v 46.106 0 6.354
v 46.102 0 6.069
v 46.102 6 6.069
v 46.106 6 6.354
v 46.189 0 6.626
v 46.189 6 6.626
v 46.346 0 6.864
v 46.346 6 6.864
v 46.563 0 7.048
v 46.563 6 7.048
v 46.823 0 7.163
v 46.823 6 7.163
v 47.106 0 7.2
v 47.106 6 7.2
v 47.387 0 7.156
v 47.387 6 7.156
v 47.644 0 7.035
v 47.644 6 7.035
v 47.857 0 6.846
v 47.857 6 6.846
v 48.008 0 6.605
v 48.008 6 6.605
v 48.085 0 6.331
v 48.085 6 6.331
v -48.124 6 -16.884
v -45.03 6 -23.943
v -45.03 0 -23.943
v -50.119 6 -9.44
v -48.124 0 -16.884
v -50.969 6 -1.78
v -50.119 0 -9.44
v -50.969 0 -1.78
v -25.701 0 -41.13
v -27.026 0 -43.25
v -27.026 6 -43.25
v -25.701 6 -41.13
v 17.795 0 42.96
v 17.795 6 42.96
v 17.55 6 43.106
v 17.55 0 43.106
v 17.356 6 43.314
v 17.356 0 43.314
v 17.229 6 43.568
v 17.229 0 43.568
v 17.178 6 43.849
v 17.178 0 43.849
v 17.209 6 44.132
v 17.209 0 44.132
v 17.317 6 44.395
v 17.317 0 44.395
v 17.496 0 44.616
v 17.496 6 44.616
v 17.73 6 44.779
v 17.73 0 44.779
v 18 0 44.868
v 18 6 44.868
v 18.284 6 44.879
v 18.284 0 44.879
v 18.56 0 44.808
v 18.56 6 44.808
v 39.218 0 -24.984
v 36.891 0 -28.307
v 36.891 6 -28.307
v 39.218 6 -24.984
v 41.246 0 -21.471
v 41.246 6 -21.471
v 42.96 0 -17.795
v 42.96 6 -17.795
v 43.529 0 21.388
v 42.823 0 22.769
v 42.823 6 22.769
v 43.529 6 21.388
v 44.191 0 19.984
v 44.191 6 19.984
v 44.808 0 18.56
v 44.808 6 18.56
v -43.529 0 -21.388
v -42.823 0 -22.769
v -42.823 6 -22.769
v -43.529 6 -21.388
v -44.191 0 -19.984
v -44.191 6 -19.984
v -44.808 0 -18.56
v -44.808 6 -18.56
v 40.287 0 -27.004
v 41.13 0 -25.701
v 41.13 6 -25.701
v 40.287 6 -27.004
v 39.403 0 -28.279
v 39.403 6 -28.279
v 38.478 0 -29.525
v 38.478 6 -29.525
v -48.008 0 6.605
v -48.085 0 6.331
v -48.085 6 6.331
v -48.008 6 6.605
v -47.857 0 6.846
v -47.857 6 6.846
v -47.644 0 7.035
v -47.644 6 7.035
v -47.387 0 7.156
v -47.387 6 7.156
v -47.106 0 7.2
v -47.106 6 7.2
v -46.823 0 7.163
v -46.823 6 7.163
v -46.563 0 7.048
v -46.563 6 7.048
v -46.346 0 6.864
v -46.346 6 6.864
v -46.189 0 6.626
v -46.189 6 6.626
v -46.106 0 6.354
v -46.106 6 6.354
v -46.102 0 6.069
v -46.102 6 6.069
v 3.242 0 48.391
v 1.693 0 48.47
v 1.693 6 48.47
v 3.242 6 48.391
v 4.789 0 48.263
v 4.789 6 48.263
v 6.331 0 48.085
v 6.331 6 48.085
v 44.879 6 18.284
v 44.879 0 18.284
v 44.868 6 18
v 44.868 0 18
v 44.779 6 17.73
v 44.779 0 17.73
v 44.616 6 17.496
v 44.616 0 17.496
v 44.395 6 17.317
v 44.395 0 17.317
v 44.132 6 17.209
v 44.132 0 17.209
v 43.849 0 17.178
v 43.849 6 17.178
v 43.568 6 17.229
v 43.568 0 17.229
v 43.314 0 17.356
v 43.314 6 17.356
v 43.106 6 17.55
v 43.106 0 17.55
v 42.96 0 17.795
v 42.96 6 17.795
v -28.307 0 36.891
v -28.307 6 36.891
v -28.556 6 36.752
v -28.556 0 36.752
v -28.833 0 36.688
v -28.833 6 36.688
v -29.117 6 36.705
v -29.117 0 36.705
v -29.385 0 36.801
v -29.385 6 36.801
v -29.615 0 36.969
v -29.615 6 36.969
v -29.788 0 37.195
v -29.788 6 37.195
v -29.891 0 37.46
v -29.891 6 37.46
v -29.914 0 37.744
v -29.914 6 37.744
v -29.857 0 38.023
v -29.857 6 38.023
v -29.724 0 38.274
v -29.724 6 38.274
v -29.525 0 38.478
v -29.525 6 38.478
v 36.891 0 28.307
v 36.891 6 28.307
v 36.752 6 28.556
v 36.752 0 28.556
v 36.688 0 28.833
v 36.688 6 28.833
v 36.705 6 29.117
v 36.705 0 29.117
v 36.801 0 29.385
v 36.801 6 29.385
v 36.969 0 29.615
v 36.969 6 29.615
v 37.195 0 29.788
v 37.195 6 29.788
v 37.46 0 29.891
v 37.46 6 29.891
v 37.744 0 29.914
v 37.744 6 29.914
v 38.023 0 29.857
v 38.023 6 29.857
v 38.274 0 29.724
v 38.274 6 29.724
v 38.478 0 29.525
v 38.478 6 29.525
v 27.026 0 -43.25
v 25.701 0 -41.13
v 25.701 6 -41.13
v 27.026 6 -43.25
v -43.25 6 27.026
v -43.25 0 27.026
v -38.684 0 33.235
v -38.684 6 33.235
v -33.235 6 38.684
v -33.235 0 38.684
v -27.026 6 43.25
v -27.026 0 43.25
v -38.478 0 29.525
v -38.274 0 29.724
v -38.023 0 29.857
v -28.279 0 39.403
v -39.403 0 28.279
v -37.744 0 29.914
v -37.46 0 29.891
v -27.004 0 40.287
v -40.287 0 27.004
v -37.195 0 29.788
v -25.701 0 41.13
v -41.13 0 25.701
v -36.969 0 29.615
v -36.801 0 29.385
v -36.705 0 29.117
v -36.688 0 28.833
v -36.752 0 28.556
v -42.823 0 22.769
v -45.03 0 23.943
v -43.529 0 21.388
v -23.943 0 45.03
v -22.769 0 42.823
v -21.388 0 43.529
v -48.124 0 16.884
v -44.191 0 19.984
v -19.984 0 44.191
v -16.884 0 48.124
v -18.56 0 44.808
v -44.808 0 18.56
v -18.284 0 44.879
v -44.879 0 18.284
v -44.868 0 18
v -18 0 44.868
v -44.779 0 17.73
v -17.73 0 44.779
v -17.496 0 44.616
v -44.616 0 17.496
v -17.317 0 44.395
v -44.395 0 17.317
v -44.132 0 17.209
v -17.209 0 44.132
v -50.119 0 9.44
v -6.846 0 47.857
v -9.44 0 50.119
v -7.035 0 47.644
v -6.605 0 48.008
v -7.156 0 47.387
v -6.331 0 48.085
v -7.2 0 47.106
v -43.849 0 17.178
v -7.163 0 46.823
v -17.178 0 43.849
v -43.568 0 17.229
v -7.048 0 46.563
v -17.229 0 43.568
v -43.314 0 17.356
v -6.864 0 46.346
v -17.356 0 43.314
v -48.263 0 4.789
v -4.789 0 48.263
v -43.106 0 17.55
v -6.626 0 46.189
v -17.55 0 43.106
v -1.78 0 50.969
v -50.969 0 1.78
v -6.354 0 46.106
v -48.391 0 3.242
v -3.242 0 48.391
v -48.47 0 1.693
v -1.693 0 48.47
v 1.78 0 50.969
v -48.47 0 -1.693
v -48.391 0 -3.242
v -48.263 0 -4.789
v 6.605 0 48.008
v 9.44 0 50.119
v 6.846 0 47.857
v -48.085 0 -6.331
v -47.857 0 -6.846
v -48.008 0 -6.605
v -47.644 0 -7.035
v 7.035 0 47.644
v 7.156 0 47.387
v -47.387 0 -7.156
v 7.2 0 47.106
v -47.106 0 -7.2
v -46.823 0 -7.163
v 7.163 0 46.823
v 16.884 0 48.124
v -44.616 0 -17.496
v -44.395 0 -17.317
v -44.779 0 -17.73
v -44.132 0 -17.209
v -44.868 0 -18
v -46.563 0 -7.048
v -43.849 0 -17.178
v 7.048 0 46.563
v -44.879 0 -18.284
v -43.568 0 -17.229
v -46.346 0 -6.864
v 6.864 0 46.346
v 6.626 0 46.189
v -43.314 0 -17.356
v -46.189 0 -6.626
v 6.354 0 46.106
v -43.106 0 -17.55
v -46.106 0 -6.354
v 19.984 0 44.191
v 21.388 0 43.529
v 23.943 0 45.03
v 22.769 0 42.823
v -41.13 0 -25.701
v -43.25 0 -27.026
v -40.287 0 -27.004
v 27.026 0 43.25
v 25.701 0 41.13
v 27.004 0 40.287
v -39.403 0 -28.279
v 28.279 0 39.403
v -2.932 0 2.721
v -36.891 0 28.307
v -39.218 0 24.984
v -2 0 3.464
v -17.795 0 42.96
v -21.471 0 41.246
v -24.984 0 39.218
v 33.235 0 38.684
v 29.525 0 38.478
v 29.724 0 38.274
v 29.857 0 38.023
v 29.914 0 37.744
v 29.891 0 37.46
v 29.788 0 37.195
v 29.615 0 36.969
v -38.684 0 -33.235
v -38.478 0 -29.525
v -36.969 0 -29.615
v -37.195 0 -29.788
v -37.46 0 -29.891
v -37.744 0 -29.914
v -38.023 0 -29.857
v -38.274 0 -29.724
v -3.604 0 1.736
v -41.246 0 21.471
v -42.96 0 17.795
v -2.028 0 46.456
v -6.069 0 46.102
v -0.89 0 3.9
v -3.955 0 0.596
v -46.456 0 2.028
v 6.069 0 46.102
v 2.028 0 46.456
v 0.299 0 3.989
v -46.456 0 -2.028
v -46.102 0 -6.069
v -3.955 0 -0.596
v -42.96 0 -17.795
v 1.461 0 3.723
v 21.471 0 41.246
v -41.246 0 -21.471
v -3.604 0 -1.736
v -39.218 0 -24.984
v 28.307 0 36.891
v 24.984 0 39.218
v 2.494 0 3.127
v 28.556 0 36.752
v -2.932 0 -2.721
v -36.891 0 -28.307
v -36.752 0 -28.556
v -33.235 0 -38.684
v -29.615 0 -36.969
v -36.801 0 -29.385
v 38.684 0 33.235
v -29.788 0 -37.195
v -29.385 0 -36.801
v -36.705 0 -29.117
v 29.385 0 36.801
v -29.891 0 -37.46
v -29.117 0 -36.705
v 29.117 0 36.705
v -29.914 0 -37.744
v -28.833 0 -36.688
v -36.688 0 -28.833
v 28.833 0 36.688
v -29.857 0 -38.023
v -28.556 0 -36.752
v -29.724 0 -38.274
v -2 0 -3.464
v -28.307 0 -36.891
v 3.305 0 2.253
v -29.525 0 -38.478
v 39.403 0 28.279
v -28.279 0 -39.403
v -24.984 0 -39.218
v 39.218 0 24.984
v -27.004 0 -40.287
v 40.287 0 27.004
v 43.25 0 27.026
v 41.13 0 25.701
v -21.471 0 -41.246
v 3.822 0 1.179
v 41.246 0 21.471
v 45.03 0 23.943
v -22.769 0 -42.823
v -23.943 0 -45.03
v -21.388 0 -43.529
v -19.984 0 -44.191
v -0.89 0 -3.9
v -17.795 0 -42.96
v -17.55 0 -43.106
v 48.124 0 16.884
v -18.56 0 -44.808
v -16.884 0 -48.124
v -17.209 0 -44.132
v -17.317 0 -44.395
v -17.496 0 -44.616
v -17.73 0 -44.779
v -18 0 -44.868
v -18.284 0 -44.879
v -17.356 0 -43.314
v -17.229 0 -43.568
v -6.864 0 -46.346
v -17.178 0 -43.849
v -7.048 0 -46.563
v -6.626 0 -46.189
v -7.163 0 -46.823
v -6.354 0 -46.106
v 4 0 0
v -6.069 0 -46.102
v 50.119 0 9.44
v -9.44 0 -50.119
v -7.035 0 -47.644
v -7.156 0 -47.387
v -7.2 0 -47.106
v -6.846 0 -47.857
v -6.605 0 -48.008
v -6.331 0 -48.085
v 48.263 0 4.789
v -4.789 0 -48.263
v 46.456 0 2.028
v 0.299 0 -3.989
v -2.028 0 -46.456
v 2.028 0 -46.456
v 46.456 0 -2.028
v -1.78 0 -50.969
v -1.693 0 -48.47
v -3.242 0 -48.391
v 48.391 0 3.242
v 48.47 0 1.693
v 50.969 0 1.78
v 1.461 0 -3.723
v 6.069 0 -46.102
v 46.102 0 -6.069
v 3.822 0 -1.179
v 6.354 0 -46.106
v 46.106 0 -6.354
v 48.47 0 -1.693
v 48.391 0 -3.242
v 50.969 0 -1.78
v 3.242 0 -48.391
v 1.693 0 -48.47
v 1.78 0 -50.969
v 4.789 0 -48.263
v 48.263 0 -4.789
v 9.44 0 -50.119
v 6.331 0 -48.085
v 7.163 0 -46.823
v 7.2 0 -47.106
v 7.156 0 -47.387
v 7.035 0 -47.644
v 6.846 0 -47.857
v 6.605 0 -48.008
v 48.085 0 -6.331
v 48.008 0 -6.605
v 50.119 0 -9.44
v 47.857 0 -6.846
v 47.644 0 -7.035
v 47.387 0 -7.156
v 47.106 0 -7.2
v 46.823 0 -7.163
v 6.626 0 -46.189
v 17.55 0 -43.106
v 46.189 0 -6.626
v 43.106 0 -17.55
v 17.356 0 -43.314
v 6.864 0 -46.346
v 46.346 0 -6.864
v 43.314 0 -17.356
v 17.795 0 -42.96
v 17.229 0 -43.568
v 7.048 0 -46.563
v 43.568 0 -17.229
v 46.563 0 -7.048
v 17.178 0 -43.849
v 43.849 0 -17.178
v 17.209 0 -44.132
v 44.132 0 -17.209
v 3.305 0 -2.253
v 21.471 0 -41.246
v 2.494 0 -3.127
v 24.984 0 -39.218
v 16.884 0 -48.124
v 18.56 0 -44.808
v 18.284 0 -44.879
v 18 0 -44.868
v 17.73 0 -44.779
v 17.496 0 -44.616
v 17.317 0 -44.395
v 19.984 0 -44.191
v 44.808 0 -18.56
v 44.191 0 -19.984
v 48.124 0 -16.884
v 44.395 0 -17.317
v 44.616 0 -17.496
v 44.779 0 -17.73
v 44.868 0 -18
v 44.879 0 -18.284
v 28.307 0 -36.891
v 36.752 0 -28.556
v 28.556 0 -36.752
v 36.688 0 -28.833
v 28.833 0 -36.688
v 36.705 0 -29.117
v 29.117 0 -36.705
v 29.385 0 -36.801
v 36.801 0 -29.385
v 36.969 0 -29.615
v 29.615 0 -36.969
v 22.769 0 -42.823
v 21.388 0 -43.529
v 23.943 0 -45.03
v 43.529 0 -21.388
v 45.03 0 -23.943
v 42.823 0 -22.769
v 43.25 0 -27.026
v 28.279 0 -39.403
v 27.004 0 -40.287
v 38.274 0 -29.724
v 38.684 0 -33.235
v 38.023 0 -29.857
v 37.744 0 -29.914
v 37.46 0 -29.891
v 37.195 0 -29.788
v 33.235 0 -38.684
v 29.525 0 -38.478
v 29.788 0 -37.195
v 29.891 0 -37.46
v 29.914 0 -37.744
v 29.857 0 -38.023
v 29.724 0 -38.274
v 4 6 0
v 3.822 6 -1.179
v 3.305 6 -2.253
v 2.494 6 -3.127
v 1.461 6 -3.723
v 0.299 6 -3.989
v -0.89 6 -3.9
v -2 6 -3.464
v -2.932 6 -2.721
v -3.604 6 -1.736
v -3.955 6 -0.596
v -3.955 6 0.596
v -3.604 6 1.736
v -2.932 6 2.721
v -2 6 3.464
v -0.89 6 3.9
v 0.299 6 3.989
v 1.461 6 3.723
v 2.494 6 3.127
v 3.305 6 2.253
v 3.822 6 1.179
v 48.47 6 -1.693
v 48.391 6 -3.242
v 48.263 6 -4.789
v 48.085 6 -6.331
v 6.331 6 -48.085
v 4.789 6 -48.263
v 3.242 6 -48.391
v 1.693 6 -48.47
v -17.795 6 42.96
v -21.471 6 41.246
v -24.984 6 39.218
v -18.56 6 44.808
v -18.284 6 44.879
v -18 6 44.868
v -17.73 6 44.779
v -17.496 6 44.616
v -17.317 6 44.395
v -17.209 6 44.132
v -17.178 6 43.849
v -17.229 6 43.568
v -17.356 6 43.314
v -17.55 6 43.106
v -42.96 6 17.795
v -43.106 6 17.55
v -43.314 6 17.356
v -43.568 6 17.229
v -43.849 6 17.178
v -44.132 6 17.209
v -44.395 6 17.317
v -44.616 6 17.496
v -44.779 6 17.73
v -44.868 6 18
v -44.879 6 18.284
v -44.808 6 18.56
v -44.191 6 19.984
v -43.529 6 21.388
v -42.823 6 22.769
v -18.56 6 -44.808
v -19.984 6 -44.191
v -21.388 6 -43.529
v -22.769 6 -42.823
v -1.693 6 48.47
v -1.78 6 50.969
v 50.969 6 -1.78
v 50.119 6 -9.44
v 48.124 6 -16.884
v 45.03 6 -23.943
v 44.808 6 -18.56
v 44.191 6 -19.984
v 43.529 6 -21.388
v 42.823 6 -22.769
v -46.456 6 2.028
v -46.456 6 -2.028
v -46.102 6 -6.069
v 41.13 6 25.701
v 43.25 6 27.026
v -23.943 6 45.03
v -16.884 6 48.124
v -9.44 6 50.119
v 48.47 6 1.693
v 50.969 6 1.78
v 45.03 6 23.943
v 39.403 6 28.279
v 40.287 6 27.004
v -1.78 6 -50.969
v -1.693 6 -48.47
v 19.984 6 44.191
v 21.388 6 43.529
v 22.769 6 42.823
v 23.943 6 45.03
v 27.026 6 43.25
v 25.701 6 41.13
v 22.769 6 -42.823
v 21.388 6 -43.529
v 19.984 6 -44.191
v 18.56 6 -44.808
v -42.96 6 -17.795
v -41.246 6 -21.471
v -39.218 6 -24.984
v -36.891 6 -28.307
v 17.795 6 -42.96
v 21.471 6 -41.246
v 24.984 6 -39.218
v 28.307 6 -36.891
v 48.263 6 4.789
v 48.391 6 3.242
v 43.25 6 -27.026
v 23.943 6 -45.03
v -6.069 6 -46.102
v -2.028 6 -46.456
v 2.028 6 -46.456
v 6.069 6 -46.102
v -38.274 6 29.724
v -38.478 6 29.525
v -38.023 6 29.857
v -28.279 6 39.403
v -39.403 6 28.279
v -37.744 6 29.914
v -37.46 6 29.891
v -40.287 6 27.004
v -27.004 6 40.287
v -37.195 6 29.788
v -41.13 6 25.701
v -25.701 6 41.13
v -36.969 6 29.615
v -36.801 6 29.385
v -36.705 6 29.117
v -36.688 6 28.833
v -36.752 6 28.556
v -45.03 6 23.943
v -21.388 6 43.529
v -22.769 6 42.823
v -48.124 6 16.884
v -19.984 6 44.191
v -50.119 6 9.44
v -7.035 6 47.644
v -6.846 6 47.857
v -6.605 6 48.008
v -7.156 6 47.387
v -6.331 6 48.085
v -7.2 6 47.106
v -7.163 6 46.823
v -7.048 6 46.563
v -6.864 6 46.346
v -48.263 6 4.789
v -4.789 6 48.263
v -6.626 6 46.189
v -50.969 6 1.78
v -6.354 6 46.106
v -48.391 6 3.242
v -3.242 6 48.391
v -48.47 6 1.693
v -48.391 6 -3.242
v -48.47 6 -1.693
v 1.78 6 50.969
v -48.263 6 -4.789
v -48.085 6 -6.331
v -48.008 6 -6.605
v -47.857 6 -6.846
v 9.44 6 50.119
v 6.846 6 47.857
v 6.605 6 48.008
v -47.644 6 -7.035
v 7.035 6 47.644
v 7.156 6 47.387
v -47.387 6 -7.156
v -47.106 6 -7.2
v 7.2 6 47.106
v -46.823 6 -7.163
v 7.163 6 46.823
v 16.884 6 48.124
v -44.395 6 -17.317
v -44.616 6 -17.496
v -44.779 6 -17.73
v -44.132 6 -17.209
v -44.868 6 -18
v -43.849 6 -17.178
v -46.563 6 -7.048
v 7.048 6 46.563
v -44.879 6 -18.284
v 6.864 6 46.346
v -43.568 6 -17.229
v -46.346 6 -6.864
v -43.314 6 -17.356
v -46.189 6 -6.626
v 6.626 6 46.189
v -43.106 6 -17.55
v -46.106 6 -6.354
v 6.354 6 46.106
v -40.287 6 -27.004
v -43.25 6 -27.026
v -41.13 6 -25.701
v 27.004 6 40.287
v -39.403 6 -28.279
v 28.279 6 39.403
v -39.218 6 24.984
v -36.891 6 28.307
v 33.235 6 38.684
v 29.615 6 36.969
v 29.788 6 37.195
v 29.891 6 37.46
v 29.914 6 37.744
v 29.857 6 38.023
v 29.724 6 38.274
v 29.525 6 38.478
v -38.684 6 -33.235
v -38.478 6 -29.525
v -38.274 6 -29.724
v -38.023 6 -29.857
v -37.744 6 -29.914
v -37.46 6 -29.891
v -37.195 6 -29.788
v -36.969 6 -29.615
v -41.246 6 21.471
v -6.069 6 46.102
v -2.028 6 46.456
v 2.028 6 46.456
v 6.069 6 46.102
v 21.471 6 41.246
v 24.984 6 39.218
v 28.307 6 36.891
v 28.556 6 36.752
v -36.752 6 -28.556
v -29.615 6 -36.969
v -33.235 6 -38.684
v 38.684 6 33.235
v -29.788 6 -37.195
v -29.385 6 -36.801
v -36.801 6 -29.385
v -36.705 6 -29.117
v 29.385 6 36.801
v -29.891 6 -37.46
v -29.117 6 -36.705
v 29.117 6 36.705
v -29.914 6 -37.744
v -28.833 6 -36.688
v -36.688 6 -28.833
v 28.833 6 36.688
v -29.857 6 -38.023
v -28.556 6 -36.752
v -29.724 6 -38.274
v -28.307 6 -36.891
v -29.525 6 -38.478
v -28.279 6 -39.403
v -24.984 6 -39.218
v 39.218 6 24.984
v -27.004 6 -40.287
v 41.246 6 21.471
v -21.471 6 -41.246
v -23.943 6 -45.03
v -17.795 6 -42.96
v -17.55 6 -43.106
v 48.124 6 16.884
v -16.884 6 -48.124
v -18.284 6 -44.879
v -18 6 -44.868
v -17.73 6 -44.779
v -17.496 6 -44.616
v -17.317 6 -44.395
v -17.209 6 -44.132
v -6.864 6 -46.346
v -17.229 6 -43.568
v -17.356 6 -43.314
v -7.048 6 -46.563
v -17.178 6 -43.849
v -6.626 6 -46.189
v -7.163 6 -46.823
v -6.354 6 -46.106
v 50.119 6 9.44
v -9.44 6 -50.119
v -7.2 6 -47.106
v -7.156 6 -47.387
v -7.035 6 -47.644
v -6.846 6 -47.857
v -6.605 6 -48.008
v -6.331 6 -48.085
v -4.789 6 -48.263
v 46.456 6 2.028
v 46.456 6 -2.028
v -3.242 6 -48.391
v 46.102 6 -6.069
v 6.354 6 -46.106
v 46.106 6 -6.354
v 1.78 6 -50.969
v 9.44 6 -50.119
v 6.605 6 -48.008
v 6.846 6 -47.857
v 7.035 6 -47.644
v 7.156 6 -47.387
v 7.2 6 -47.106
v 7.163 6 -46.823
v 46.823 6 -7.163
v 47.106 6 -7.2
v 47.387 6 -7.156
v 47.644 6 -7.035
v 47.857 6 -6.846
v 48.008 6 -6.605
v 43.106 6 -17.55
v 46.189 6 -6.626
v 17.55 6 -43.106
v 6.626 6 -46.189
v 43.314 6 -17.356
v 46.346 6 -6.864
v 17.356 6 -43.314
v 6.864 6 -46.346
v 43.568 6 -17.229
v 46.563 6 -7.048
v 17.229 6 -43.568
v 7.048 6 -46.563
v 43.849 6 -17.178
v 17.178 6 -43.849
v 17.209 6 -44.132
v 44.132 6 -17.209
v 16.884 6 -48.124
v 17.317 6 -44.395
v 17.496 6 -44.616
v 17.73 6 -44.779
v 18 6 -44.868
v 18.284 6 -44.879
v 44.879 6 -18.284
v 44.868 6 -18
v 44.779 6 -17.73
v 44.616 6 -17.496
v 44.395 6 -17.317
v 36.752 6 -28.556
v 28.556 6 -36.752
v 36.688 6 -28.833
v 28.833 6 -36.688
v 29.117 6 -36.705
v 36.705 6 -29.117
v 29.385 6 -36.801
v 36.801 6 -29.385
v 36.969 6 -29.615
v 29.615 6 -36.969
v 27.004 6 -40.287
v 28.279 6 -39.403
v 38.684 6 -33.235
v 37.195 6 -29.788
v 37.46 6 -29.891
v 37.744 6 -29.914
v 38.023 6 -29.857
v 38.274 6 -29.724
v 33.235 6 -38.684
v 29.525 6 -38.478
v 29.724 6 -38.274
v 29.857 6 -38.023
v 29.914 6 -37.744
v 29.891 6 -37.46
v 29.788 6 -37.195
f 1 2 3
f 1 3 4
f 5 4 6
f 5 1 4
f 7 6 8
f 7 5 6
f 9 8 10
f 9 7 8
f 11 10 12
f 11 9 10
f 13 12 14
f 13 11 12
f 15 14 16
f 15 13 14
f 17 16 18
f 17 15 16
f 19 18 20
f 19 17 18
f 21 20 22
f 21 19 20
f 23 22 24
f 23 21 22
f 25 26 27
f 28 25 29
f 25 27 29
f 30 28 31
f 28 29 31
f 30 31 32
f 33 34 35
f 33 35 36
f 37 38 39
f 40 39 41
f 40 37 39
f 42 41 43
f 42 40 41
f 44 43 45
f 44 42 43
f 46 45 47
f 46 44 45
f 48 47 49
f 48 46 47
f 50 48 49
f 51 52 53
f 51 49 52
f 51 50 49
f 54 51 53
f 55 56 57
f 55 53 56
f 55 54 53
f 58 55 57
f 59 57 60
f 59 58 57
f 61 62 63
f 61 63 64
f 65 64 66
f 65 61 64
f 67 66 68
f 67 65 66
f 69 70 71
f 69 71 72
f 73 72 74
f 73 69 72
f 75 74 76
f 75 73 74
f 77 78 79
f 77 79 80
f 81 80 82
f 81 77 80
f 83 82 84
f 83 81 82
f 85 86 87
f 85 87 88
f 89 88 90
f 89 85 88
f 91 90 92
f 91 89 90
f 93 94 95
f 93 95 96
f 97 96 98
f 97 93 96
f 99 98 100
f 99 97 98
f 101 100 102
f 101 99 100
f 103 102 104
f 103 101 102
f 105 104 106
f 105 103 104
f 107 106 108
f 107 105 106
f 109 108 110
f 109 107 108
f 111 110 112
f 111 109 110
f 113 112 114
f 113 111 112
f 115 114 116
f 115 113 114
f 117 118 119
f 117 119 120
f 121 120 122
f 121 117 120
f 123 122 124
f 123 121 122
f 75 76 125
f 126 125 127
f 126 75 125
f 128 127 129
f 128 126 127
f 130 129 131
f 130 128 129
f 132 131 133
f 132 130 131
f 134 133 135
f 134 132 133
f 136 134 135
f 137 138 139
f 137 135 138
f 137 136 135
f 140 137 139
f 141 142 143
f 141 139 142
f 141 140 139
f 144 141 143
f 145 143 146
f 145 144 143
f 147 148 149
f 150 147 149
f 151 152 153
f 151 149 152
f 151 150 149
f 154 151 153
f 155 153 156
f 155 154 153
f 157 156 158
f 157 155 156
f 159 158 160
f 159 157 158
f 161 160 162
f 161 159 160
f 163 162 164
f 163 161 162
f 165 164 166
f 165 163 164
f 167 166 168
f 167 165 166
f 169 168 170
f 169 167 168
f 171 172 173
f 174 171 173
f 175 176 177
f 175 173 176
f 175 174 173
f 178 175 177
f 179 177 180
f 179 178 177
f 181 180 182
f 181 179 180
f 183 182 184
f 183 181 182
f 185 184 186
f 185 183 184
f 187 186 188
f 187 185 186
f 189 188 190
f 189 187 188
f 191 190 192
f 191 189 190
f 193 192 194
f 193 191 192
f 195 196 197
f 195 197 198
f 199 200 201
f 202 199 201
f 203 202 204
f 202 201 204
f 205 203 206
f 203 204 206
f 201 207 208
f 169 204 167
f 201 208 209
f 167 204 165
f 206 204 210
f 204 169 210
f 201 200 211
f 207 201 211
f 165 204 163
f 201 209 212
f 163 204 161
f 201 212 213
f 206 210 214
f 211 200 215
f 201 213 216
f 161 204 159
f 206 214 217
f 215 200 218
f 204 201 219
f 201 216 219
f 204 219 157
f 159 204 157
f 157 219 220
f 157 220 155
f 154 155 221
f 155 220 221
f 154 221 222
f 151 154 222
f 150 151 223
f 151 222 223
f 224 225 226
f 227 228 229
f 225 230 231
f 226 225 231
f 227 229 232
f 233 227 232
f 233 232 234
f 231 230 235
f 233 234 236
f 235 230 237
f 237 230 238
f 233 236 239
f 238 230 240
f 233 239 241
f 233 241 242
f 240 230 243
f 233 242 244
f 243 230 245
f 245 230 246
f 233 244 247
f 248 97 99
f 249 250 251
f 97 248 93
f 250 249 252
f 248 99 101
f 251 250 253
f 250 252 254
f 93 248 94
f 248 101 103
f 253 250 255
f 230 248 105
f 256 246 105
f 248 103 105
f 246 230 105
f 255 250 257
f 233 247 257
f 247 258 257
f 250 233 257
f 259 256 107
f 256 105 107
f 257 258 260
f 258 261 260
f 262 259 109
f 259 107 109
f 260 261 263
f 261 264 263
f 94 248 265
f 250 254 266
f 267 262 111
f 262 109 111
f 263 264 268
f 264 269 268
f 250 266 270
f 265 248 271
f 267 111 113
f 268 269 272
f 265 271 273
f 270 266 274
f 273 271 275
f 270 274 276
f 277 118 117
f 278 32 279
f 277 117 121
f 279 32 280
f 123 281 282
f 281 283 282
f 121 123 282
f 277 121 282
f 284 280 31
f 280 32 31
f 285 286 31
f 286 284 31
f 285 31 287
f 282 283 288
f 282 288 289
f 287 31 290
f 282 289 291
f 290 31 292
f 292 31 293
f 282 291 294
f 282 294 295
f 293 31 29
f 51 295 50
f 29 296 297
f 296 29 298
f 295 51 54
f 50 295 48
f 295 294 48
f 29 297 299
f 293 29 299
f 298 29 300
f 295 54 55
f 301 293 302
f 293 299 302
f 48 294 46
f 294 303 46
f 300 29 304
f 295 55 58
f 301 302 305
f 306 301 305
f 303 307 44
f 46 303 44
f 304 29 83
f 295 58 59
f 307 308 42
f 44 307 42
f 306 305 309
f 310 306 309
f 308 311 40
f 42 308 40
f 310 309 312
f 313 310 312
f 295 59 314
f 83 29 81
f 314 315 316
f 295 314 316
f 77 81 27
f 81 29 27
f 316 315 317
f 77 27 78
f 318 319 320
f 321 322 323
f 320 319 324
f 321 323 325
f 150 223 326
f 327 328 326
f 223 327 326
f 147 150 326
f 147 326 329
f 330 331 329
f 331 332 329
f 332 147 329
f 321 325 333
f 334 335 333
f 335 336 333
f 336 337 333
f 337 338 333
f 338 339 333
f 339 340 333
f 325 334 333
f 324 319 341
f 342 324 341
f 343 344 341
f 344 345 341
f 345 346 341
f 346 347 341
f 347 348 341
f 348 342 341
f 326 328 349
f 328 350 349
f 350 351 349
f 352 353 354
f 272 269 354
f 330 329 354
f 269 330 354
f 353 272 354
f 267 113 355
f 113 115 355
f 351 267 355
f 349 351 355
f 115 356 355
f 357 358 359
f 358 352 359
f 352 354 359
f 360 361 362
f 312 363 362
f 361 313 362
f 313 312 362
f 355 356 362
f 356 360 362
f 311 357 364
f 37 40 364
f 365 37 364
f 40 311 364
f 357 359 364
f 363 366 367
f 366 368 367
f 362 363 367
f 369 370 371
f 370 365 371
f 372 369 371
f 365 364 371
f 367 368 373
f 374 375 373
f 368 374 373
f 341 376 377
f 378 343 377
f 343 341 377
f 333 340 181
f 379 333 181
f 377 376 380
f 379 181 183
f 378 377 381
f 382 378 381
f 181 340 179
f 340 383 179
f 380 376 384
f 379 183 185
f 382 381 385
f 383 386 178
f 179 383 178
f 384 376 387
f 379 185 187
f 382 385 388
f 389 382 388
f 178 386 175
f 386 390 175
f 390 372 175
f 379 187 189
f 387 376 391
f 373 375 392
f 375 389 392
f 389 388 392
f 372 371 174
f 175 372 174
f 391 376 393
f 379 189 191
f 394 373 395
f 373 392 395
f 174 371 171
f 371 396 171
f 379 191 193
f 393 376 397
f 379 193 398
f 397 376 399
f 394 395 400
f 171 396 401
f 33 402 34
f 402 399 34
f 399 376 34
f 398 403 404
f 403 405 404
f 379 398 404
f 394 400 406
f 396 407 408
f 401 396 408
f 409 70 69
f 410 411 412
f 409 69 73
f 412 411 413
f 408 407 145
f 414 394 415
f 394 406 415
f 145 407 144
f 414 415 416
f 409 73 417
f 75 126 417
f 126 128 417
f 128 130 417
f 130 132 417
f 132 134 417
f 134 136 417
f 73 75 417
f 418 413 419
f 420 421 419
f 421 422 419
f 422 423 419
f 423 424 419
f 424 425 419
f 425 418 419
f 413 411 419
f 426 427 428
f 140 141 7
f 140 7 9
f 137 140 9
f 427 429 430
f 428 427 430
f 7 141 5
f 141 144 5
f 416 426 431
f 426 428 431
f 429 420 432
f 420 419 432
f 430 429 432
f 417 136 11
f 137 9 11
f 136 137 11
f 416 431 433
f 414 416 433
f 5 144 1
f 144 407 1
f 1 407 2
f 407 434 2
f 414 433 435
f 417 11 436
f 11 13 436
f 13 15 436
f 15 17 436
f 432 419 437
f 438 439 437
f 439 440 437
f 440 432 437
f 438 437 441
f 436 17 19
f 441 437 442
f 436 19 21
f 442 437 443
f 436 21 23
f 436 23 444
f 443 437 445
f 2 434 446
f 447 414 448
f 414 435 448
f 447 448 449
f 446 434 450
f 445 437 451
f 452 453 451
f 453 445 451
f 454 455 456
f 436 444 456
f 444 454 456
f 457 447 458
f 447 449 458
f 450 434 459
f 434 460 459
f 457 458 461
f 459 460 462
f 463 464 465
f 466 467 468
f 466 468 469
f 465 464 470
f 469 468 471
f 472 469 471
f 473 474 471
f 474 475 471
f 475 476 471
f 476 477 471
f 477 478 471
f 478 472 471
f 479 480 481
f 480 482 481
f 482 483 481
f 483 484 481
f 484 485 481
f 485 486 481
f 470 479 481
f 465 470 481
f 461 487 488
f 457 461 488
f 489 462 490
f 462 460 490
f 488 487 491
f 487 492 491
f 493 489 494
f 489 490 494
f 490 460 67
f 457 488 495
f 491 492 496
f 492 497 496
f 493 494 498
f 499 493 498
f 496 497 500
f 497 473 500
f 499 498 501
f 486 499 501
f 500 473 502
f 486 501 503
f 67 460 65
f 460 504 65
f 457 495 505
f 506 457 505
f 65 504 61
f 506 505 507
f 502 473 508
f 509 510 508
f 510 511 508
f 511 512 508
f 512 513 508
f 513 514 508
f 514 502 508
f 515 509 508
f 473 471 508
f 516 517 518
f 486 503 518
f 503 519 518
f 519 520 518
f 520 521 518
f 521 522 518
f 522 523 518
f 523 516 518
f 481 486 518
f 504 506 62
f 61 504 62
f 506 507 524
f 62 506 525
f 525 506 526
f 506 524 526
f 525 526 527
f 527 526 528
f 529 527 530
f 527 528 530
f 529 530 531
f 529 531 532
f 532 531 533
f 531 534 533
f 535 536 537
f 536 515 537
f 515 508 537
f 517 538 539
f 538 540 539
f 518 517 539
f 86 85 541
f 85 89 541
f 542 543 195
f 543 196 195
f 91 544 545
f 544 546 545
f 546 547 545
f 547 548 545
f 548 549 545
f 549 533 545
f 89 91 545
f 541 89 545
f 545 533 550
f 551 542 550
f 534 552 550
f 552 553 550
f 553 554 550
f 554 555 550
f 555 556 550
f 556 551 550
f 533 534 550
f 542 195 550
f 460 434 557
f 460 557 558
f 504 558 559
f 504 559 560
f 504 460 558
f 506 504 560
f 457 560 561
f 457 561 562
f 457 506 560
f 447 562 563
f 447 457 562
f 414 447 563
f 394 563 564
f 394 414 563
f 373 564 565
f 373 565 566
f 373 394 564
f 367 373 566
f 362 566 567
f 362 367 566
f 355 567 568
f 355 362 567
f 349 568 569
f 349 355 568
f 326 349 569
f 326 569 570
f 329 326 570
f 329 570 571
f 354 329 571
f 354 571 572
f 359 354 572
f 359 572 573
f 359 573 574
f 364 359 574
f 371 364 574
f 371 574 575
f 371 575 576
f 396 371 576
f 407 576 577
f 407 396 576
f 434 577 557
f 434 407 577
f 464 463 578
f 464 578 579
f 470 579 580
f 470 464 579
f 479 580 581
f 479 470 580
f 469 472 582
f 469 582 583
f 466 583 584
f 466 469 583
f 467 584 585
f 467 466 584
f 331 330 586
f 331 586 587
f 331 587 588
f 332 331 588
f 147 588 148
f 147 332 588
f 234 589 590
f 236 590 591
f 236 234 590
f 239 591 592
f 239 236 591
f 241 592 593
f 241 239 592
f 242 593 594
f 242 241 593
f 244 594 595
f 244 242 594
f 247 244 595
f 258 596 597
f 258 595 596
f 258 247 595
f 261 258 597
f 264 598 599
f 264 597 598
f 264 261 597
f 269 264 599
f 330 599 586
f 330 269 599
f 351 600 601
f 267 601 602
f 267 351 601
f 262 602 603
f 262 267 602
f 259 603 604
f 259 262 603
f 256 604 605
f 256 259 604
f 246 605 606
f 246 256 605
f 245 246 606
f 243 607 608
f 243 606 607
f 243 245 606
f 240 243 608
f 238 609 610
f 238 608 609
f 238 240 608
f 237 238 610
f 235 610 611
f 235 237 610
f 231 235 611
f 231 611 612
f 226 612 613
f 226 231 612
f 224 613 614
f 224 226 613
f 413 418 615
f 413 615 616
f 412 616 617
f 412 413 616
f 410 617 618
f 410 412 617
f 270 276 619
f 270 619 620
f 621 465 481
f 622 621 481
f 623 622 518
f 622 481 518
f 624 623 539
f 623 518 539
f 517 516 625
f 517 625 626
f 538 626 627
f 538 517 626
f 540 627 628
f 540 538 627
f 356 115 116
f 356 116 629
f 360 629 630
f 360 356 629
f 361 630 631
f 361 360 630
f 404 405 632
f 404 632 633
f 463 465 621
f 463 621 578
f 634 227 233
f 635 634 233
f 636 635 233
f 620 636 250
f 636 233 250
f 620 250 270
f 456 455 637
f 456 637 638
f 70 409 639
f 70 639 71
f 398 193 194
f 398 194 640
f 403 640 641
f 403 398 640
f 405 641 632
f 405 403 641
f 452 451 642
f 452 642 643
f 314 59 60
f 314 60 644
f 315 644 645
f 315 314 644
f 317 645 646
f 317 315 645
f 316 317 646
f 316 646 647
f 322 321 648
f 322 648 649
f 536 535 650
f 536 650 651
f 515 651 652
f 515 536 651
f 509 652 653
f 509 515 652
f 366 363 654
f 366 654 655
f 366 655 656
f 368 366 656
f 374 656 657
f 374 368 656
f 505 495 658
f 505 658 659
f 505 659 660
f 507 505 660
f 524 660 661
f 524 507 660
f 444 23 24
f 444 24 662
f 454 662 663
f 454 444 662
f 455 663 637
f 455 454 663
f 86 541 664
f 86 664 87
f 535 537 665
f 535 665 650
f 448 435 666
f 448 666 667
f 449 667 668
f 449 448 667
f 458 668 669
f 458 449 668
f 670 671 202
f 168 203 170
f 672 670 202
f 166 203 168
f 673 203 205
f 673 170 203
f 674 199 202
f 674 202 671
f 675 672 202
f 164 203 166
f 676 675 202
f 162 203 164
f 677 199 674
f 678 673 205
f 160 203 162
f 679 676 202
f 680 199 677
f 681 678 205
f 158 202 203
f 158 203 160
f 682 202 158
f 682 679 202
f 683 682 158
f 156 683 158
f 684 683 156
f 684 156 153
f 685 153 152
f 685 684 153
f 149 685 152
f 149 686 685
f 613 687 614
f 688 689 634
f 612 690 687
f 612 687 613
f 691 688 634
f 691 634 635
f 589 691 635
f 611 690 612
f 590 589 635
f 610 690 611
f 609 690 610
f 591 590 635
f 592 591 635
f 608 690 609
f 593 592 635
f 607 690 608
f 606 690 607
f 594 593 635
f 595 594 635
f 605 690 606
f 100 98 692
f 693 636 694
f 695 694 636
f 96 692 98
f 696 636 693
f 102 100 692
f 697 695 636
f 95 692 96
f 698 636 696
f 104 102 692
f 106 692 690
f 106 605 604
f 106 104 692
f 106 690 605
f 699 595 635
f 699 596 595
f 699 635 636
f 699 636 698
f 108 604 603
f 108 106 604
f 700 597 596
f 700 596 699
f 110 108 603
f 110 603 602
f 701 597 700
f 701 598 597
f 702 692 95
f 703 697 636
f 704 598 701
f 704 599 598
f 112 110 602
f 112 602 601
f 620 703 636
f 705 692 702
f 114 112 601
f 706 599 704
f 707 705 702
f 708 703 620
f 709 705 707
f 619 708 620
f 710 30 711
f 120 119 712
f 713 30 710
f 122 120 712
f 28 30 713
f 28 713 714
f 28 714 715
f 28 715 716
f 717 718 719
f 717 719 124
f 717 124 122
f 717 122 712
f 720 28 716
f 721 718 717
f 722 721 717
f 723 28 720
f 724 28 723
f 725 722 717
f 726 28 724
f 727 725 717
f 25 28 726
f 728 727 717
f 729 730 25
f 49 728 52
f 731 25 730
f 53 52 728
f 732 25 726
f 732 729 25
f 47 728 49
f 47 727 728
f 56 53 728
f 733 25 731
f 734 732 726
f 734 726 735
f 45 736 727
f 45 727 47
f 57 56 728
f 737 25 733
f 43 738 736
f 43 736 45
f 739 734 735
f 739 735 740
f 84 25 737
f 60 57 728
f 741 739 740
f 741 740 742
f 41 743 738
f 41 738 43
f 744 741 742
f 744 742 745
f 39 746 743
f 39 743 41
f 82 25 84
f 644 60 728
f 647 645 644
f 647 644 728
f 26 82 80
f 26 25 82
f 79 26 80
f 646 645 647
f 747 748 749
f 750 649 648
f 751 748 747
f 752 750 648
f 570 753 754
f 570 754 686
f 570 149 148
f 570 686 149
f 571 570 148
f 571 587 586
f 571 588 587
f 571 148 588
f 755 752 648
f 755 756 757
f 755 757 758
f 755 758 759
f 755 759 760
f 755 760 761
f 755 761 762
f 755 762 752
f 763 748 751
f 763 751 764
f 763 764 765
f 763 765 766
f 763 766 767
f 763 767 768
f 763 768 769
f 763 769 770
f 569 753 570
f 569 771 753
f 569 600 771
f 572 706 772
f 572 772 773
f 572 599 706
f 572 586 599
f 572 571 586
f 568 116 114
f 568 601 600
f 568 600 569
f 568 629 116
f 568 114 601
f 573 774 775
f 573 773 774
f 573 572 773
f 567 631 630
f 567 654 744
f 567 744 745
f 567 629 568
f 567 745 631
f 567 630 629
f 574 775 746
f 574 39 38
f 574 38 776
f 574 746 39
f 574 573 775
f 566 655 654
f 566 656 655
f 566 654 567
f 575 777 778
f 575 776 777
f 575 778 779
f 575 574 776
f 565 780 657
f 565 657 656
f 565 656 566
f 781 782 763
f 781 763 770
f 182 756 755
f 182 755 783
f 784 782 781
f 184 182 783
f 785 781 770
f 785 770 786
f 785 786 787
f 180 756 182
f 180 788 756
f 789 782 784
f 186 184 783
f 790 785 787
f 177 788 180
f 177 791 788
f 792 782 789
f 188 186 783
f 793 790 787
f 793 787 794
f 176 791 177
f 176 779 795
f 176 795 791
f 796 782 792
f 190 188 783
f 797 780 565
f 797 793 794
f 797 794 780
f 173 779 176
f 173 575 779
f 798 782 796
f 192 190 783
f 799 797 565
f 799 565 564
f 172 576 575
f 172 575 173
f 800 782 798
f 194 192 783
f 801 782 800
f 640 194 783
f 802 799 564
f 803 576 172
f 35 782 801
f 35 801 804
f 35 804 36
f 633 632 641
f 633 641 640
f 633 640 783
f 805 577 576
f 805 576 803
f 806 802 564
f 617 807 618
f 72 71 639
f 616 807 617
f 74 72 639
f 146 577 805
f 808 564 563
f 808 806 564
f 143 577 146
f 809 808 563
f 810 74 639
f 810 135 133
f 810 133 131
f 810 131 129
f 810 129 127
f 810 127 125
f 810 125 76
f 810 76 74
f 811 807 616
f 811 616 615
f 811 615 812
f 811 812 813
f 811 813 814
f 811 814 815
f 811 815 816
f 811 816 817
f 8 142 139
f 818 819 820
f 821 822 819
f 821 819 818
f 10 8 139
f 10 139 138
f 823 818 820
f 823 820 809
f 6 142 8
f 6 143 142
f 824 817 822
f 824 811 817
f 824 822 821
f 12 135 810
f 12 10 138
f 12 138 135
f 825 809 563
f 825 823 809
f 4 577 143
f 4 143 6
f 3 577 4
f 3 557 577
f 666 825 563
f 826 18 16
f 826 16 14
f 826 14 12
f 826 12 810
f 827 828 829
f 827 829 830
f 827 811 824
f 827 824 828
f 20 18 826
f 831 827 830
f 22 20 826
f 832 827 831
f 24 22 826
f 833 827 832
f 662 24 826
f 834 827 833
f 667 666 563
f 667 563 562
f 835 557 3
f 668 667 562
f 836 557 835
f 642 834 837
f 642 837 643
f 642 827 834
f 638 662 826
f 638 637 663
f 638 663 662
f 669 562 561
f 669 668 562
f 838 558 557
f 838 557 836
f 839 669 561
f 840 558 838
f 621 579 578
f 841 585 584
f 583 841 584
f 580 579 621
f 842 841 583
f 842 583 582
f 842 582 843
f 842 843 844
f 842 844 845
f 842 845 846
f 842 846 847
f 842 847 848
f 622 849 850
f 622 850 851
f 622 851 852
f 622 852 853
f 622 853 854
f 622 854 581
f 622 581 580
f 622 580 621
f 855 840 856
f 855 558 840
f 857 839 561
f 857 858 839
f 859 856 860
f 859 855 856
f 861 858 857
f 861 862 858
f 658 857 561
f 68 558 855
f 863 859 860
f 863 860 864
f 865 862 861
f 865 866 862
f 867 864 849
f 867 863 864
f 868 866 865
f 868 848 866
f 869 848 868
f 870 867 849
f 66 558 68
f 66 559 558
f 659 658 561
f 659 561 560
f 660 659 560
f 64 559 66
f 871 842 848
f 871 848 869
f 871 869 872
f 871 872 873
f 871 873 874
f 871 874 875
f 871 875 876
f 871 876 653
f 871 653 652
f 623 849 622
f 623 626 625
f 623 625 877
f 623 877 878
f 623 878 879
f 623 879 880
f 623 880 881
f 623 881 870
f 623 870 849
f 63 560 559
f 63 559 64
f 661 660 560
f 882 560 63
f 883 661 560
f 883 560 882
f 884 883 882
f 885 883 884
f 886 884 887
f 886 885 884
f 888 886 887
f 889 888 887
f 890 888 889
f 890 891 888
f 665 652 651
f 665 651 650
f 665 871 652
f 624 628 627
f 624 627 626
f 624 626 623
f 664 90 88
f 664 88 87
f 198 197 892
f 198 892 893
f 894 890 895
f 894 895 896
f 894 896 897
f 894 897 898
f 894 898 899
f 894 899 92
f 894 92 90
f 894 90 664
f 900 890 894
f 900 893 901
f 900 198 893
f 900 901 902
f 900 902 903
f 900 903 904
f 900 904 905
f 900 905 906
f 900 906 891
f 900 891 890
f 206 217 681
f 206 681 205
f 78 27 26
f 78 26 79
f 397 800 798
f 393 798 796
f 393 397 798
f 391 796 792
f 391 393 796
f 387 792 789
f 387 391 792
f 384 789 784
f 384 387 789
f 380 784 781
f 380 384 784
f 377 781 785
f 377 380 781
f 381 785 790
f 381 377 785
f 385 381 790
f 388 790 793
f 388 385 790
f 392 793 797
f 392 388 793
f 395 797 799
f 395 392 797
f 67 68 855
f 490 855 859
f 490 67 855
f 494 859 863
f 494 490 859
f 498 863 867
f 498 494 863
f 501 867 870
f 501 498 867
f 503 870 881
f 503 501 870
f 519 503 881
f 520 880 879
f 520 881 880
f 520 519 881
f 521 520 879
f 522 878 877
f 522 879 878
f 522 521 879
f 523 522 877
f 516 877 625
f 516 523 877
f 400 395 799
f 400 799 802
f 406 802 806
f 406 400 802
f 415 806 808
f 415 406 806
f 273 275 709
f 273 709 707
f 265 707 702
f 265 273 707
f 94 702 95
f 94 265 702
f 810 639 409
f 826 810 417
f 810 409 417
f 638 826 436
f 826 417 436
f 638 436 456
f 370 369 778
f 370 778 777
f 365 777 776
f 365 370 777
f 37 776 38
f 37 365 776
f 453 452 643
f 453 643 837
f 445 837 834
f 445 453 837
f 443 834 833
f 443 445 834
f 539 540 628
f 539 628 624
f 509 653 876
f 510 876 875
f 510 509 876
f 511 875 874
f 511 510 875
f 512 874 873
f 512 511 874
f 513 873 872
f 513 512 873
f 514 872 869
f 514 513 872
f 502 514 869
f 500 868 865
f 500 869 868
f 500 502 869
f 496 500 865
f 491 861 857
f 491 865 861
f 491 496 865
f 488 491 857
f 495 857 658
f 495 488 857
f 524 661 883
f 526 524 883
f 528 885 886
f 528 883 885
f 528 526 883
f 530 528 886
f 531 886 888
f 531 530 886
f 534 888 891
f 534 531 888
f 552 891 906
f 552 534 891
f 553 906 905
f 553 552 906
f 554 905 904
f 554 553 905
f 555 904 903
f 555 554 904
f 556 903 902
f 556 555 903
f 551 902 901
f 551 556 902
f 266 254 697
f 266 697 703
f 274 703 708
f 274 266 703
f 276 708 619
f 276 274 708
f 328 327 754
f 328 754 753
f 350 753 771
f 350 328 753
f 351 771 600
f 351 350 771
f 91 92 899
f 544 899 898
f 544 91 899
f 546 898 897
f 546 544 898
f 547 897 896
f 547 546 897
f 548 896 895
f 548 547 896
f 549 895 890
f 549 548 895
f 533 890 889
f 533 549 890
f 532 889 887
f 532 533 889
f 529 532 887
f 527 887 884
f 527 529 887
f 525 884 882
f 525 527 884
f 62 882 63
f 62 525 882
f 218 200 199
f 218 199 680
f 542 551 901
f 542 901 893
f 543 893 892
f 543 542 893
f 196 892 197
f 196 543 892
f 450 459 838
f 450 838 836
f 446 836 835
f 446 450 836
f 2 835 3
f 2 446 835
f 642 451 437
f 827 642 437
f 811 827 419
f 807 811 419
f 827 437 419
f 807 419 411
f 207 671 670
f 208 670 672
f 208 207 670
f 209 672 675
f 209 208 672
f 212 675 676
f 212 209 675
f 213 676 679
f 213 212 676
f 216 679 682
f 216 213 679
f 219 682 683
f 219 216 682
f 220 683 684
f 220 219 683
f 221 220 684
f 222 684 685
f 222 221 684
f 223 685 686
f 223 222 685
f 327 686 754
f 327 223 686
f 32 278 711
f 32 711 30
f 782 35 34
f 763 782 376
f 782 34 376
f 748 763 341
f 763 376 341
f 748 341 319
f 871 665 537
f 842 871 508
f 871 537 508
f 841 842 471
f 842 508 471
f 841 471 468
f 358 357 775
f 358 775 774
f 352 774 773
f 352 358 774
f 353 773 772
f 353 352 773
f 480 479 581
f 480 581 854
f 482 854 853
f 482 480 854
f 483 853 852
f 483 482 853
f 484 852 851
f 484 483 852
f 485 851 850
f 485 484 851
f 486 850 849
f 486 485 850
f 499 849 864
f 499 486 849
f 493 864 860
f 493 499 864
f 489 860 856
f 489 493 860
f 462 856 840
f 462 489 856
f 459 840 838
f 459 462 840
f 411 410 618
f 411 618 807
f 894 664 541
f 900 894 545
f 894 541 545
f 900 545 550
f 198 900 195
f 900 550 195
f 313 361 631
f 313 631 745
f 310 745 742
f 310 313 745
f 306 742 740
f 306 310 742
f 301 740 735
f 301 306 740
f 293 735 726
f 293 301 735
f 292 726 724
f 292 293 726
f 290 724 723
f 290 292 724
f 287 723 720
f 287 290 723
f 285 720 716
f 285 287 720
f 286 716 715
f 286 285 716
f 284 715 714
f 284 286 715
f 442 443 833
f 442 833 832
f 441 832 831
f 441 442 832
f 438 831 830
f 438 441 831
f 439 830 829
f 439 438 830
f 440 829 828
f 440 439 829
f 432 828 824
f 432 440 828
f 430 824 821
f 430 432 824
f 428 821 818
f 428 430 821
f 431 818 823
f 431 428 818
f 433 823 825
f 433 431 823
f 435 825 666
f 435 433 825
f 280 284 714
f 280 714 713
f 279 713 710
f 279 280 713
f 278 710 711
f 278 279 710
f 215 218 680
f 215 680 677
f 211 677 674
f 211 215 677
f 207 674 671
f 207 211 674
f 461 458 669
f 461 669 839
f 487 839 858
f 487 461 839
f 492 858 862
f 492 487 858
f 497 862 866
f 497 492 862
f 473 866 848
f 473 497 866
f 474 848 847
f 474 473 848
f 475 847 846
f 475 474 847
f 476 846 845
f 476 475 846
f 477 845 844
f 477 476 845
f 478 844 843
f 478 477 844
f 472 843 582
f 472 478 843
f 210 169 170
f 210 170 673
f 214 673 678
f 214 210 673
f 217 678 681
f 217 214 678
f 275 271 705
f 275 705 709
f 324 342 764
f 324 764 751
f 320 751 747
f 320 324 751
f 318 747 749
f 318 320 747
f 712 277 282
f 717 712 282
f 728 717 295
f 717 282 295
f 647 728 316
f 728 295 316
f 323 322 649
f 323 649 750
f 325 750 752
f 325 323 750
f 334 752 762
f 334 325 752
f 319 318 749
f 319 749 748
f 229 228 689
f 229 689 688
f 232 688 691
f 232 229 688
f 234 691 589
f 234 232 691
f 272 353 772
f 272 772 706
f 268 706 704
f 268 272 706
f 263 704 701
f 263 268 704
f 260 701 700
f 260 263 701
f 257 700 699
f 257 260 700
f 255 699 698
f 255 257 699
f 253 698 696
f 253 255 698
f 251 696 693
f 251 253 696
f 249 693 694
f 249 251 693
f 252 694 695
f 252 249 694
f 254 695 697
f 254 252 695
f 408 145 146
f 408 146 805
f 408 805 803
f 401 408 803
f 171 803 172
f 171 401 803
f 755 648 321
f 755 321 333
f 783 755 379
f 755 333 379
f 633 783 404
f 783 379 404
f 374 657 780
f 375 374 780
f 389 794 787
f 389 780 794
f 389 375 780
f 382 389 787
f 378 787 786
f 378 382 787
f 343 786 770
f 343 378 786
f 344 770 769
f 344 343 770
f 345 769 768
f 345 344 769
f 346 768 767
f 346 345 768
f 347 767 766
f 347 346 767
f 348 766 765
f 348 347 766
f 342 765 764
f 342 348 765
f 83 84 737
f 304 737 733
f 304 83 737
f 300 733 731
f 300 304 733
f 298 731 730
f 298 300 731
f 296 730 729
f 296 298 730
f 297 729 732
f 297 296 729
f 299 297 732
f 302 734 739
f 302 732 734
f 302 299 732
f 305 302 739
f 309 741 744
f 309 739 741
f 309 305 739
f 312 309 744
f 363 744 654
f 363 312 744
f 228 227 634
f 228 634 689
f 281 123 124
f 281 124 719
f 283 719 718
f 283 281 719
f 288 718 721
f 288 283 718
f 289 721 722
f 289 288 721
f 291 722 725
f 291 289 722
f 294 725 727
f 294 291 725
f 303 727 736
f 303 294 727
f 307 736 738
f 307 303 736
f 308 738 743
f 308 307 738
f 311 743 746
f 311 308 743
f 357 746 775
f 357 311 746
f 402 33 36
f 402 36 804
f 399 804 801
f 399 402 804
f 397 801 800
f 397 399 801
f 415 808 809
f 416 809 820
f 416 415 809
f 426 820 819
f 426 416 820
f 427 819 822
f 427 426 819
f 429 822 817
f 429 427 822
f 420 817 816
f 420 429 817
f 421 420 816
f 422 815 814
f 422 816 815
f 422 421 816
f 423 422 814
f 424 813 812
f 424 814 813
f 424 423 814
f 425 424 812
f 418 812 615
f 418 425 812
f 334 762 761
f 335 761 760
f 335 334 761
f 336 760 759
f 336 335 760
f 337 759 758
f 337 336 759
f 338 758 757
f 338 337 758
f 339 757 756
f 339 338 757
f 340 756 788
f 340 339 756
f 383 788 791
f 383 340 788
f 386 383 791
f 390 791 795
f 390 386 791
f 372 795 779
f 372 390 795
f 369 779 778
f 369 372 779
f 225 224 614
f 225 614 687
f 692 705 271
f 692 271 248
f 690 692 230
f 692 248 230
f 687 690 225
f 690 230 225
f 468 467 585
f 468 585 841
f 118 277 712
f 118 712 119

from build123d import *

# Parameters (mm, degrees)
SKETCH1_R           = 51
BOSS_EXTRUDE1_DEPTH = 6
CUT_EXTRUDE1_DEPTH  = 7
SKETCH3_R           = 4
CUT_EXTRUDE2_DEPTH  = 6


with BuildPart() as part:
    # Sketch1 → Boss-Extrude1 (new body)
    with BuildSketch(Plane(origin=(0, 0, 0), x_dir=(1, 0, 0), z_dir=(0, 1, 0))):
        Circle(SKETCH1_R)
    extrude(amount=BOSS_EXTRUDE1_DEPTH)

    # Sketch2 → Cut-Extrude1 (cut, through all)
    with BuildSketch(Plane(origin=(0, 0, 0), x_dir=(1, 0, 0), z_dir=(0, 1, 0))):
        with BuildLine():
            Line((-1.779874332, 50.968932178), (-1.69262559, 48.47045511))
            ThreePointArc((-1.69262559, 48.47045511), (-4.016198064, 48.333426871), (-6.330520323, 48.085075777))
            ThreePointArc((-6.330520323, 48.085075777), (-7.191438992, 46.963104723), (-6.069467938, 46.102186054))
            ThreePointArc((-6.069467938, 46.102186054), (0, 46.5), (6.069467938, 46.102186054))
            ThreePointArc((6.069467938, 46.102186054), (7.191438992, 46.963104723), (6.330520323, 48.085075777))
            ThreePointArc((6.330520323, 48.085075777), (4.016198064, 48.333426871), (1.69262559, 48.47045511))
            Line((1.69262559, 48.47045511), (1.779874332, 50.968932178))
            ThreePointArc((1.779874332, 50.968932178), (0, 51), (-1.779874332, 50.968932178))
        make_face()
        with BuildLine():
            Line((23.943049702, 45.030327236), (22.769370795, 42.822958254))
            ThreePointArc((22.769370795, 42.822958254), (20.688583885, 43.866074555), (18.56014647, 44.808157327))
            ThreePointArc((18.56014647, 44.808157327), (17.253583505, 44.266961227), (17.794779605, 42.960398262))
            ThreePointArc((17.794779605, 42.960398262), (23.25, 40.270181276), (28.307406449, 36.890930324))
            ThreePointArc((28.307406449, 36.890930324), (29.709521218, 37.075522235), (29.524929307, 38.477637004))
            ThreePointArc((29.524929307, 38.477637004), (27.644842986, 39.84987649), (25.701084315, 41.130332664))
            Line((25.701084315, 41.130332664), (27.025882476, 43.250452904))
            ThreePointArc((27.025882476, 43.250452904), (25.5, 44.167295593), (23.943049702, 45.030327236))
        make_face()
        with BuildLine():
            Line((43.250452904, 27.025882476), (41.130332664, 25.701084315))
            ThreePointArc((41.130332664, 25.701084315), (39.84987649, 27.644842986), (38.477637004, 29.524929307))
            ThreePointArc((38.477637004, 29.524929307), (37.075522235, 29.709521218), (36.890930324, 28.307406449))
            ThreePointArc((36.890930324, 28.307406449), (40.270181276, 23.25), (42.960398262, 17.794779605))
            ThreePointArc((42.960398262, 17.794779605), (44.266961227, 17.253583505), (44.808157327, 18.56014647))
            ThreePointArc((44.808157327, 18.56014647), (43.866074555, 20.688583885), (42.822958254, 22.769370795))
            Line((42.822958254, 22.769370795), (45.030327236, 23.943049702))
            ThreePointArc((45.030327236, 23.943049702), (44.167295593, 25.5), (43.250452904, 27.025882476))
        make_face()
        with BuildLine():
            Line((50.968932178, 1.779874332), (48.47045511, 1.69262559))
            ThreePointArc((48.47045511, 1.69262559), (48.333426871, 4.016198064), (48.085075777, 6.330520323))
            ThreePointArc((48.085075777, 6.330520323), (46.963104723, 7.191438992), (46.102186054, 6.069467938))
            ThreePointArc((46.102186054, 6.069467938), (46.5, 0), (46.102186054, -6.069467938))
            ThreePointArc((46.102186054, -6.069467938), (46.963104723, -7.191438992), (48.085075777, -6.330520323))
            ThreePointArc((48.085075777, -6.330520323), (48.333426871, -4.016198064), (48.47045511, -1.69262559))
            Line((48.47045511, -1.69262559), (50.968932178, -1.779874332))
            ThreePointArc((50.968932178, -1.779874332), (51, 0), (50.968932178, 1.779874332))
        make_face()
        with BuildLine():
            Line((45.030327236, -23.943049702), (42.822958254, -22.769370795))
            ThreePointArc((42.822958254, -22.769370795), (43.866074555, -20.688583885), (44.808157327, -18.56014647))
            ThreePointArc((44.808157327, -18.56014647), (44.266961227, -17.253583505), (42.960398262, -17.794779605))
            ThreePointArc((42.960398262, -17.794779605), (40.270181276, -23.25), (36.890930324, -28.307406449))
            ThreePointArc((36.890930324, -28.307406449), (37.075522235, -29.709521218), (38.477637004, -29.524929307))
            ThreePointArc((38.477637004, -29.524929307), (39.84987649, -27.644842986), (41.130332664, -25.701084315))
            Line((41.130332664, -25.701084315), (43.250452904, -27.025882476))
            ThreePointArc((43.250452904, -27.025882476), (44.167295593, -25.5), (45.030327236, -23.943049702))
        make_face()
        with BuildLine():
            Line((27.025882476, -43.250452904), (25.701084315, -41.130332664))
            ThreePointArc((25.701084315, -41.130332664), (27.644842986, -39.84987649), (29.524929307, -38.477637004))
            ThreePointArc((29.524929307, -38.477637004), (29.709521218, -37.075522235), (28.307406449, -36.890930324))
            ThreePointArc((28.307406449, -36.890930324), (23.25, -40.270181276), (17.794779605, -42.960398262))
            ThreePointArc((17.794779605, -42.960398262), (17.253583505, -44.266961227), (18.56014647, -44.808157327))
            ThreePointArc((18.56014647, -44.808157327), (20.688583885, -43.866074555), (22.769370795, -42.822958254))
            Line((22.769370795, -42.822958254), (23.943049702, -45.030327236))
            ThreePointArc((23.943049702, -45.030327236), (25.5, -44.167295593), (27.025882476, -43.250452904))
        make_face()
        with BuildLine():
            Line((1.779874332, -50.968932178), (1.69262559, -48.47045511))
            ThreePointArc((1.69262559, -48.47045511), (4.016198064, -48.333426871), (6.330520323, -48.085075777))
            ThreePointArc((6.330520323, -48.085075777), (7.191438992, -46.963104723), (6.069467938, -46.102186054))
            ThreePointArc((6.069467938, -46.102186054), (0, -46.5), (-6.069467938, -46.102186054))
            ThreePointArc((-6.069467938, -46.102186054), (-7.191438992, -46.963104723), (-6.330520323, -48.085075777))
            ThreePointArc((-6.330520323, -48.085075777), (-4.016198064, -48.333426871), (-1.69262559, -48.47045511))
            Line((-1.69262559, -48.47045511), (-1.779874332, -50.968932178))
            ThreePointArc((-1.779874332, -50.968932178), (0, -51), (1.779874332, -50.968932178))
        make_face()
        with BuildLine():
            Line((-23.943049702, -45.030327236), (-22.769370795, -42.822958254))
            ThreePointArc((-22.769370795, -42.822958254), (-20.688583885, -43.866074555), (-18.56014647, -44.808157327))
            ThreePointArc((-18.56014647, -44.808157327), (-17.253583505, -44.266961227), (-17.794779605, -42.960398262))
            ThreePointArc((-17.794779605, -42.960398262), (-23.25, -40.270181276), (-28.307406449, -36.890930324))
            ThreePointArc((-28.307406449, -36.890930324), (-29.709521218, -37.075522235), (-29.524929307, -38.477637004))
            ThreePointArc((-29.524929307, -38.477637004), (-27.644842986, -39.84987649), (-25.701084315, -41.130332664))
            Line((-25.701084315, -41.130332664), (-27.025882476, -43.250452904))
            ThreePointArc((-27.025882476, -43.250452904), (-25.5, -44.167295593), (-23.943049702, -45.030327236))
        make_face()
        with BuildLine():
            Line((-43.250452904, -27.025882476), (-41.130332664, -25.701084315))
            ThreePointArc((-41.130332664, -25.701084315), (-39.84987649, -27.644842986), (-38.477637004, -29.524929307))
            ThreePointArc((-38.477637004, -29.524929307), (-37.075522235, -29.709521218), (-36.890930324, -28.307406449))
            ThreePointArc((-36.890930324, -28.307406449), (-40.270181276, -23.25), (-42.960398262, -17.794779605))
            ThreePointArc((-42.960398262, -17.794779605), (-44.266961227, -17.253583505), (-44.808157327, -18.56014647))
            ThreePointArc((-44.808157327, -18.56014647), (-43.866074555, -20.688583885), (-42.822958254, -22.769370795))
            Line((-42.822958254, -22.769370795), (-45.030327236, -23.943049702))
            ThreePointArc((-45.030327236, -23.943049702), (-44.167295593, -25.5), (-43.250452904, -27.025882476))
        make_face()
        with BuildLine():
            Line((-50.968932178, -1.779874332), (-48.47045511, -1.69262559))
            ThreePointArc((-48.47045511, -1.69262559), (-48.333426871, -4.016198064), (-48.085075777, -6.330520323))
            ThreePointArc((-48.085075777, -6.330520323), (-46.963104723, -7.191438992), (-46.102186054, -6.069467938))
            ThreePointArc((-46.102186054, -6.069467938), (-46.5, 0), (-46.102186054, 6.069467938))
            ThreePointArc((-46.102186054, 6.069467938), (-46.963104723, 7.191438992), (-48.085075777, 6.330520323))
            ThreePointArc((-48.085075777, 6.330520323), (-48.333426871, 4.016198064), (-48.47045511, 1.69262559))
            Line((-48.47045511, 1.69262559), (-50.968932178, 1.779874332))
            ThreePointArc((-50.968932178, 1.779874332), (-51, 0), (-50.968932178, -1.779874332))
        make_face()
        with BuildLine():
            Line((-45.030327236, 23.943049702), (-42.822958254, 22.769370795))
            ThreePointArc((-42.822958254, 22.769370795), (-43.866074555, 20.688583885), (-44.808157327, 18.56014647))
            ThreePointArc((-44.808157327, 18.56014647), (-44.266961227, 17.253583505), (-42.960398262, 17.794779605))
            ThreePointArc((-42.960398262, 17.794779605), (-40.270181276, 23.25), (-36.890930324, 28.307406449))
            ThreePointArc((-36.890930324, 28.307406449), (-37.075522235, 29.709521218), (-38.477637004, 29.524929307))
            ThreePointArc((-38.477637004, 29.524929307), (-39.84987649, 27.644842986), (-41.130332664, 25.701084315))
            Line((-41.130332664, 25.701084315), (-43.250452904, 27.025882476))
            ThreePointArc((-43.250452904, 27.025882476), (-44.167295593, 25.5), (-45.030327236, 23.943049702))
        make_face()
        with BuildLine():
            Line((-27.025882476, 43.250452904), (-25.701084315, 41.130332664))
            ThreePointArc((-25.701084315, 41.130332664), (-27.644842986, 39.84987649), (-29.524929307, 38.477637004))
            ThreePointArc((-29.524929307, 38.477637004), (-29.709521218, 37.075522235), (-28.307406449, 36.890930324))
            ThreePointArc((-28.307406449, 36.890930324), (-23.25, 40.270181276), (-17.794779605, 42.960398262))
            ThreePointArc((-17.794779605, 42.960398262), (-17.253583505, 44.266961227), (-18.56014647, 44.808157327))
            ThreePointArc((-18.56014647, 44.808157327), (-20.688583885, 43.866074555), (-22.769370795, 42.822958254))
            Line((-22.769370795, 42.822958254), (-23.943049702, 45.030327236))
            ThreePointArc((-23.943049702, 45.030327236), (-25.5, 44.167295593), (-27.025882476, 43.250452904))
        make_face()
    extrude(amount=CUT_EXTRUDE1_DEPTH, mode=Mode.SUBTRACT)

    # Sketch3 → Cut-Extrude2 (cut)
    with BuildSketch(Plane(origin=(0, 0, 0), x_dir=(1, 0, 0), z_dir=(0, 1, 0))):
        Circle(SKETCH3_R)
    extrude(amount=CUT_EXTRUDE2_DEPTH, mode=Mode.SUBTRACT)


solid = part.part
